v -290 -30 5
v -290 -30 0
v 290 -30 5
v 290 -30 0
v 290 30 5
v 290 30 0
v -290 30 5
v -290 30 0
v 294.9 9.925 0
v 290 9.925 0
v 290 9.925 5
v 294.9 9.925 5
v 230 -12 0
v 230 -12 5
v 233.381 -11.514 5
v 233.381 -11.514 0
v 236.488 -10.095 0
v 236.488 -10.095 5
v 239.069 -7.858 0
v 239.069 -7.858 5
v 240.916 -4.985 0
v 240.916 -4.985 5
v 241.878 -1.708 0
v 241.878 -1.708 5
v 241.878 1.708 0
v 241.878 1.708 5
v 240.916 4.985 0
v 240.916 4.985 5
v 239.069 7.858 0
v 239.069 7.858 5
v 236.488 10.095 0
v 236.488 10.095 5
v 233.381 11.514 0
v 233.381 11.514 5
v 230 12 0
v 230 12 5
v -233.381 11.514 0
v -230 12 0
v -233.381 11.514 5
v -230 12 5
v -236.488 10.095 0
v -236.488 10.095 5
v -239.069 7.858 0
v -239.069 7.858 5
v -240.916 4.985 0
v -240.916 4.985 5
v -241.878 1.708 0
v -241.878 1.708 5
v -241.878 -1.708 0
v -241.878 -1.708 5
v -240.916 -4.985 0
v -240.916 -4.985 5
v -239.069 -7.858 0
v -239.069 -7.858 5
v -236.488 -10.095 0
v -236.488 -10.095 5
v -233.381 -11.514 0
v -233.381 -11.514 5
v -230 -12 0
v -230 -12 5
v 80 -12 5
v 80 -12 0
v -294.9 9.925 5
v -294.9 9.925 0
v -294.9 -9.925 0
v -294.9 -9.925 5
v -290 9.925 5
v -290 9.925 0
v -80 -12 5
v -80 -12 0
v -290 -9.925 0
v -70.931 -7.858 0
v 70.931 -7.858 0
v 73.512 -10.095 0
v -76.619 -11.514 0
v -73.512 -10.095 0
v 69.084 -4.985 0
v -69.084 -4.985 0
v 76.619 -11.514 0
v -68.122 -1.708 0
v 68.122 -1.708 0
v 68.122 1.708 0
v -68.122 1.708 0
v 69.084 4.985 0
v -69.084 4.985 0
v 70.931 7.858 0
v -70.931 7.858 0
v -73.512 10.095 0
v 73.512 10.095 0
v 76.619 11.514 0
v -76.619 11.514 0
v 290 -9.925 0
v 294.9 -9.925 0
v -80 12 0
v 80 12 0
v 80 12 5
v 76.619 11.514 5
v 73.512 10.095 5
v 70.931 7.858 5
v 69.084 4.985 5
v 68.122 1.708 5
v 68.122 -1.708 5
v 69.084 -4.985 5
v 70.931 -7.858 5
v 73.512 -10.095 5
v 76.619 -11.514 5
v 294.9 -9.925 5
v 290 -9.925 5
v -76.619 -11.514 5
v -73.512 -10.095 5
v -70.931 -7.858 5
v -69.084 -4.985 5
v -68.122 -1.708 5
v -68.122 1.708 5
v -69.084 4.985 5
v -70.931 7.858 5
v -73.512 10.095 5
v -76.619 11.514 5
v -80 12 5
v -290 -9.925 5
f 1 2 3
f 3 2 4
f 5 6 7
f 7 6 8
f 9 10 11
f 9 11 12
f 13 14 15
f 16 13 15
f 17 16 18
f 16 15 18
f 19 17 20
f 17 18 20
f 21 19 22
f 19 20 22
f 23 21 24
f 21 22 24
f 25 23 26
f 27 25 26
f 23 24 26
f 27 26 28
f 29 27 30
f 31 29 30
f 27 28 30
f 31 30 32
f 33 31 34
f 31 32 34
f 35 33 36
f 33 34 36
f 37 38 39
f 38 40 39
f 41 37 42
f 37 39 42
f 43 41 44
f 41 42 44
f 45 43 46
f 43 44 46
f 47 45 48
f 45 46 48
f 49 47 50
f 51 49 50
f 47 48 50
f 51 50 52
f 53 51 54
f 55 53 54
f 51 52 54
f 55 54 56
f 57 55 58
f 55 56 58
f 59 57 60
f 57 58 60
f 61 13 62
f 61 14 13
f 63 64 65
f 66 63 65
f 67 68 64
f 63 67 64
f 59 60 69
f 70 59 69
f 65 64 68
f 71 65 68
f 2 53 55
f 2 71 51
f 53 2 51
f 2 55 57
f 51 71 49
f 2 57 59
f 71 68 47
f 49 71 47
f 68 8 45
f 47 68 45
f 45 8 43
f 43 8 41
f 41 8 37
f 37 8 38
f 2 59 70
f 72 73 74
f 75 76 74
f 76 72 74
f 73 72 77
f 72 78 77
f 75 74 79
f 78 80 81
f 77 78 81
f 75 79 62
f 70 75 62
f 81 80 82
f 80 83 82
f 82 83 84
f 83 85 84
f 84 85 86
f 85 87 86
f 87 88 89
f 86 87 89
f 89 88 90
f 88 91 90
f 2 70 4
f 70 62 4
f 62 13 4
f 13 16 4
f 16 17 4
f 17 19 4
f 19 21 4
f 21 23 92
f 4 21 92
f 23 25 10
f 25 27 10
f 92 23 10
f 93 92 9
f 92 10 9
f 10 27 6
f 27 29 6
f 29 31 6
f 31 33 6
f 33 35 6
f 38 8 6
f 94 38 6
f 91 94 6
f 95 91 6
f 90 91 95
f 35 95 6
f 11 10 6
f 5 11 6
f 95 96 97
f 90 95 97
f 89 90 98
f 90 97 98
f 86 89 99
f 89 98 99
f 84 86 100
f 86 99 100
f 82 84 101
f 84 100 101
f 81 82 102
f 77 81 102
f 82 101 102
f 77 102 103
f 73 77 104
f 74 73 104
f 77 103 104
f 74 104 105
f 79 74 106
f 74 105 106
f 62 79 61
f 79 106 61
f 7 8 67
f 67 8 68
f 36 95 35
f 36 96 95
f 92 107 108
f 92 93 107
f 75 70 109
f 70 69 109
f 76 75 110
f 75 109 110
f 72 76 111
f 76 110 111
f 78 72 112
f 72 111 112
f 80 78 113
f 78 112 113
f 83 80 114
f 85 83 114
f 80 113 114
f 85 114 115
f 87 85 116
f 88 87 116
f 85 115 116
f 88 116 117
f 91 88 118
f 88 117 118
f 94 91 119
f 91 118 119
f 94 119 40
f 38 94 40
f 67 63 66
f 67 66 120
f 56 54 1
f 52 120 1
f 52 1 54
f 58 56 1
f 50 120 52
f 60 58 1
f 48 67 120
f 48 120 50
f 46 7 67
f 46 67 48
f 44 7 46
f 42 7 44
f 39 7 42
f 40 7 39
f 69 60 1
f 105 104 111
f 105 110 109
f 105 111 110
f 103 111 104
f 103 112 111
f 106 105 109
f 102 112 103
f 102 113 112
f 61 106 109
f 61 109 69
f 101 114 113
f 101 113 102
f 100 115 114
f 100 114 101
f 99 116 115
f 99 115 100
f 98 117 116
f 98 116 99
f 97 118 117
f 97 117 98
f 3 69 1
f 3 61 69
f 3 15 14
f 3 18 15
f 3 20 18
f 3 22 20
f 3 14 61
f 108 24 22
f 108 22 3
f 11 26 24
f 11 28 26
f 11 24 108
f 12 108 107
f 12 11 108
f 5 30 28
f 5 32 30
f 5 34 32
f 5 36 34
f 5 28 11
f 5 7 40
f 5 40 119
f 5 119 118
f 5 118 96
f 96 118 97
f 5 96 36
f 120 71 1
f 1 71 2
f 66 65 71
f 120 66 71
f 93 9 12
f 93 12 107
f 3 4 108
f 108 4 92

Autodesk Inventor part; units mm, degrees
ref_plane "YZ Plane" through (0, 0, 0) normal (1, 0, 0) x (0, 1, 0)
ref_plane "XZ Plane" through (0, 0, 0) normal (0, 1, 0) x (-1, 0, 0)
ref_plane "XY Plane" through (0, 0, 0) normal (0, 0, 1) x (1, 0, 0)
sketch "Sketch1" plane through (0, 0, 0) normal (0, 0, 1) x (1, 0, 0)
  line L0 (-290, -30) -> (290, -30)
  line L1 (290, -30) -> (290, 30)
  line L2 (290, 30) -> (-290, 30)
  line L3 (-290, 30) -> (-290, -30)
  line L4 (-290, -30) -> (290, 30) construction
  line L5 (290, -30) -> (-290, 30) construction
  line L6 (-290, 9.925) -> (-294.9, 9.925)
  line L7 (-294.9, 9.925) -> (-294.9, -9.925)
  line L8 (-294.9, -9.925) -> (-290, -9.925)
  line L9 (-290, -9.925) -> (-290, 9.925)
  line L10 (0, 30) -> (0, -30)
  line L11 (290, 9.925) -> (294.9, 9.925)
  line L12 (294.9, 9.925) -> (294.9, -9.925)
  line L13 (294.9, -9.925) -> (290, -9.925)
  line L14 (290, -9.925) -> (290, 9.925)
  point P0 (0, 0)
  point P1 (-290, 0)
  point P2 (-290, 0)
  point P3 (290, 0)
  point P4 (290, 0)
  dimension "d0" = 580
  dimension "d1" = 60
  dimension "d2" = 4.9
  dimension "d3" = 19.85
extrude "Plate1" add sketch "Sketch1" along normal blind 5
sketch "Sketch2" plane through (0, 0, 5) normal (0, 0, 1) x (1, 0, 0)
  line L0 (-230, 0) -> (-80, 0) construction
  line L1 (-230, -12) -> (-80, -12)
  line L2 (-80, 12) -> (-230, 12)
  arc A0 (-230, 12) -> (-230, -12) centre (-230, 0) ccw
  arc A1 (-80, -12) -> (-80, 12) centre (-80, 0) ccw
  line L3 (0, 30) -> (0, -30)
  line L4 (290, -30) -> (-290, -30) projected
  line L5 (-290, 30) -> (290, 30) projected
  line L6 (230, 0) -> (80, 0) construction
  line L7 (230, -12) -> (80, -12)
  line L8 (80, 12) -> (230, 12)
  arc A2 (230, -12) -> (230, 12) centre (230, 0) ccw
  arc A3 (80, 12) -> (80, -12) centre (80, 0) ccw
  point P0 (0, 0)
  point P1 (-155, 0)
  point P2 (155, 0)
  dimension "d5" = 12
  dimension "d6" = 150
  dimension "d7" = 80
extrude "Cut1" cut sketch "Sketch2" against normal blind 5
equation "\"d8\" = Thickness"
equation "\"d4\" = Thickness"
equation "\"BendRadius\" = Thickness"
equation "\"BendReliefWidth\" = Thickness"
equation "\"BendReliefDepth\" = 0.5 * Thickness"
equation "\"TransitionRadius\" = BendRadius"
equation "\"JacobiRadiusSize\" = BendRadius"
equation "\"GapSize\" = Thickness"
equation "\"Thickness\" = 5"
properties part number "Table-Base Supporter 1st"
